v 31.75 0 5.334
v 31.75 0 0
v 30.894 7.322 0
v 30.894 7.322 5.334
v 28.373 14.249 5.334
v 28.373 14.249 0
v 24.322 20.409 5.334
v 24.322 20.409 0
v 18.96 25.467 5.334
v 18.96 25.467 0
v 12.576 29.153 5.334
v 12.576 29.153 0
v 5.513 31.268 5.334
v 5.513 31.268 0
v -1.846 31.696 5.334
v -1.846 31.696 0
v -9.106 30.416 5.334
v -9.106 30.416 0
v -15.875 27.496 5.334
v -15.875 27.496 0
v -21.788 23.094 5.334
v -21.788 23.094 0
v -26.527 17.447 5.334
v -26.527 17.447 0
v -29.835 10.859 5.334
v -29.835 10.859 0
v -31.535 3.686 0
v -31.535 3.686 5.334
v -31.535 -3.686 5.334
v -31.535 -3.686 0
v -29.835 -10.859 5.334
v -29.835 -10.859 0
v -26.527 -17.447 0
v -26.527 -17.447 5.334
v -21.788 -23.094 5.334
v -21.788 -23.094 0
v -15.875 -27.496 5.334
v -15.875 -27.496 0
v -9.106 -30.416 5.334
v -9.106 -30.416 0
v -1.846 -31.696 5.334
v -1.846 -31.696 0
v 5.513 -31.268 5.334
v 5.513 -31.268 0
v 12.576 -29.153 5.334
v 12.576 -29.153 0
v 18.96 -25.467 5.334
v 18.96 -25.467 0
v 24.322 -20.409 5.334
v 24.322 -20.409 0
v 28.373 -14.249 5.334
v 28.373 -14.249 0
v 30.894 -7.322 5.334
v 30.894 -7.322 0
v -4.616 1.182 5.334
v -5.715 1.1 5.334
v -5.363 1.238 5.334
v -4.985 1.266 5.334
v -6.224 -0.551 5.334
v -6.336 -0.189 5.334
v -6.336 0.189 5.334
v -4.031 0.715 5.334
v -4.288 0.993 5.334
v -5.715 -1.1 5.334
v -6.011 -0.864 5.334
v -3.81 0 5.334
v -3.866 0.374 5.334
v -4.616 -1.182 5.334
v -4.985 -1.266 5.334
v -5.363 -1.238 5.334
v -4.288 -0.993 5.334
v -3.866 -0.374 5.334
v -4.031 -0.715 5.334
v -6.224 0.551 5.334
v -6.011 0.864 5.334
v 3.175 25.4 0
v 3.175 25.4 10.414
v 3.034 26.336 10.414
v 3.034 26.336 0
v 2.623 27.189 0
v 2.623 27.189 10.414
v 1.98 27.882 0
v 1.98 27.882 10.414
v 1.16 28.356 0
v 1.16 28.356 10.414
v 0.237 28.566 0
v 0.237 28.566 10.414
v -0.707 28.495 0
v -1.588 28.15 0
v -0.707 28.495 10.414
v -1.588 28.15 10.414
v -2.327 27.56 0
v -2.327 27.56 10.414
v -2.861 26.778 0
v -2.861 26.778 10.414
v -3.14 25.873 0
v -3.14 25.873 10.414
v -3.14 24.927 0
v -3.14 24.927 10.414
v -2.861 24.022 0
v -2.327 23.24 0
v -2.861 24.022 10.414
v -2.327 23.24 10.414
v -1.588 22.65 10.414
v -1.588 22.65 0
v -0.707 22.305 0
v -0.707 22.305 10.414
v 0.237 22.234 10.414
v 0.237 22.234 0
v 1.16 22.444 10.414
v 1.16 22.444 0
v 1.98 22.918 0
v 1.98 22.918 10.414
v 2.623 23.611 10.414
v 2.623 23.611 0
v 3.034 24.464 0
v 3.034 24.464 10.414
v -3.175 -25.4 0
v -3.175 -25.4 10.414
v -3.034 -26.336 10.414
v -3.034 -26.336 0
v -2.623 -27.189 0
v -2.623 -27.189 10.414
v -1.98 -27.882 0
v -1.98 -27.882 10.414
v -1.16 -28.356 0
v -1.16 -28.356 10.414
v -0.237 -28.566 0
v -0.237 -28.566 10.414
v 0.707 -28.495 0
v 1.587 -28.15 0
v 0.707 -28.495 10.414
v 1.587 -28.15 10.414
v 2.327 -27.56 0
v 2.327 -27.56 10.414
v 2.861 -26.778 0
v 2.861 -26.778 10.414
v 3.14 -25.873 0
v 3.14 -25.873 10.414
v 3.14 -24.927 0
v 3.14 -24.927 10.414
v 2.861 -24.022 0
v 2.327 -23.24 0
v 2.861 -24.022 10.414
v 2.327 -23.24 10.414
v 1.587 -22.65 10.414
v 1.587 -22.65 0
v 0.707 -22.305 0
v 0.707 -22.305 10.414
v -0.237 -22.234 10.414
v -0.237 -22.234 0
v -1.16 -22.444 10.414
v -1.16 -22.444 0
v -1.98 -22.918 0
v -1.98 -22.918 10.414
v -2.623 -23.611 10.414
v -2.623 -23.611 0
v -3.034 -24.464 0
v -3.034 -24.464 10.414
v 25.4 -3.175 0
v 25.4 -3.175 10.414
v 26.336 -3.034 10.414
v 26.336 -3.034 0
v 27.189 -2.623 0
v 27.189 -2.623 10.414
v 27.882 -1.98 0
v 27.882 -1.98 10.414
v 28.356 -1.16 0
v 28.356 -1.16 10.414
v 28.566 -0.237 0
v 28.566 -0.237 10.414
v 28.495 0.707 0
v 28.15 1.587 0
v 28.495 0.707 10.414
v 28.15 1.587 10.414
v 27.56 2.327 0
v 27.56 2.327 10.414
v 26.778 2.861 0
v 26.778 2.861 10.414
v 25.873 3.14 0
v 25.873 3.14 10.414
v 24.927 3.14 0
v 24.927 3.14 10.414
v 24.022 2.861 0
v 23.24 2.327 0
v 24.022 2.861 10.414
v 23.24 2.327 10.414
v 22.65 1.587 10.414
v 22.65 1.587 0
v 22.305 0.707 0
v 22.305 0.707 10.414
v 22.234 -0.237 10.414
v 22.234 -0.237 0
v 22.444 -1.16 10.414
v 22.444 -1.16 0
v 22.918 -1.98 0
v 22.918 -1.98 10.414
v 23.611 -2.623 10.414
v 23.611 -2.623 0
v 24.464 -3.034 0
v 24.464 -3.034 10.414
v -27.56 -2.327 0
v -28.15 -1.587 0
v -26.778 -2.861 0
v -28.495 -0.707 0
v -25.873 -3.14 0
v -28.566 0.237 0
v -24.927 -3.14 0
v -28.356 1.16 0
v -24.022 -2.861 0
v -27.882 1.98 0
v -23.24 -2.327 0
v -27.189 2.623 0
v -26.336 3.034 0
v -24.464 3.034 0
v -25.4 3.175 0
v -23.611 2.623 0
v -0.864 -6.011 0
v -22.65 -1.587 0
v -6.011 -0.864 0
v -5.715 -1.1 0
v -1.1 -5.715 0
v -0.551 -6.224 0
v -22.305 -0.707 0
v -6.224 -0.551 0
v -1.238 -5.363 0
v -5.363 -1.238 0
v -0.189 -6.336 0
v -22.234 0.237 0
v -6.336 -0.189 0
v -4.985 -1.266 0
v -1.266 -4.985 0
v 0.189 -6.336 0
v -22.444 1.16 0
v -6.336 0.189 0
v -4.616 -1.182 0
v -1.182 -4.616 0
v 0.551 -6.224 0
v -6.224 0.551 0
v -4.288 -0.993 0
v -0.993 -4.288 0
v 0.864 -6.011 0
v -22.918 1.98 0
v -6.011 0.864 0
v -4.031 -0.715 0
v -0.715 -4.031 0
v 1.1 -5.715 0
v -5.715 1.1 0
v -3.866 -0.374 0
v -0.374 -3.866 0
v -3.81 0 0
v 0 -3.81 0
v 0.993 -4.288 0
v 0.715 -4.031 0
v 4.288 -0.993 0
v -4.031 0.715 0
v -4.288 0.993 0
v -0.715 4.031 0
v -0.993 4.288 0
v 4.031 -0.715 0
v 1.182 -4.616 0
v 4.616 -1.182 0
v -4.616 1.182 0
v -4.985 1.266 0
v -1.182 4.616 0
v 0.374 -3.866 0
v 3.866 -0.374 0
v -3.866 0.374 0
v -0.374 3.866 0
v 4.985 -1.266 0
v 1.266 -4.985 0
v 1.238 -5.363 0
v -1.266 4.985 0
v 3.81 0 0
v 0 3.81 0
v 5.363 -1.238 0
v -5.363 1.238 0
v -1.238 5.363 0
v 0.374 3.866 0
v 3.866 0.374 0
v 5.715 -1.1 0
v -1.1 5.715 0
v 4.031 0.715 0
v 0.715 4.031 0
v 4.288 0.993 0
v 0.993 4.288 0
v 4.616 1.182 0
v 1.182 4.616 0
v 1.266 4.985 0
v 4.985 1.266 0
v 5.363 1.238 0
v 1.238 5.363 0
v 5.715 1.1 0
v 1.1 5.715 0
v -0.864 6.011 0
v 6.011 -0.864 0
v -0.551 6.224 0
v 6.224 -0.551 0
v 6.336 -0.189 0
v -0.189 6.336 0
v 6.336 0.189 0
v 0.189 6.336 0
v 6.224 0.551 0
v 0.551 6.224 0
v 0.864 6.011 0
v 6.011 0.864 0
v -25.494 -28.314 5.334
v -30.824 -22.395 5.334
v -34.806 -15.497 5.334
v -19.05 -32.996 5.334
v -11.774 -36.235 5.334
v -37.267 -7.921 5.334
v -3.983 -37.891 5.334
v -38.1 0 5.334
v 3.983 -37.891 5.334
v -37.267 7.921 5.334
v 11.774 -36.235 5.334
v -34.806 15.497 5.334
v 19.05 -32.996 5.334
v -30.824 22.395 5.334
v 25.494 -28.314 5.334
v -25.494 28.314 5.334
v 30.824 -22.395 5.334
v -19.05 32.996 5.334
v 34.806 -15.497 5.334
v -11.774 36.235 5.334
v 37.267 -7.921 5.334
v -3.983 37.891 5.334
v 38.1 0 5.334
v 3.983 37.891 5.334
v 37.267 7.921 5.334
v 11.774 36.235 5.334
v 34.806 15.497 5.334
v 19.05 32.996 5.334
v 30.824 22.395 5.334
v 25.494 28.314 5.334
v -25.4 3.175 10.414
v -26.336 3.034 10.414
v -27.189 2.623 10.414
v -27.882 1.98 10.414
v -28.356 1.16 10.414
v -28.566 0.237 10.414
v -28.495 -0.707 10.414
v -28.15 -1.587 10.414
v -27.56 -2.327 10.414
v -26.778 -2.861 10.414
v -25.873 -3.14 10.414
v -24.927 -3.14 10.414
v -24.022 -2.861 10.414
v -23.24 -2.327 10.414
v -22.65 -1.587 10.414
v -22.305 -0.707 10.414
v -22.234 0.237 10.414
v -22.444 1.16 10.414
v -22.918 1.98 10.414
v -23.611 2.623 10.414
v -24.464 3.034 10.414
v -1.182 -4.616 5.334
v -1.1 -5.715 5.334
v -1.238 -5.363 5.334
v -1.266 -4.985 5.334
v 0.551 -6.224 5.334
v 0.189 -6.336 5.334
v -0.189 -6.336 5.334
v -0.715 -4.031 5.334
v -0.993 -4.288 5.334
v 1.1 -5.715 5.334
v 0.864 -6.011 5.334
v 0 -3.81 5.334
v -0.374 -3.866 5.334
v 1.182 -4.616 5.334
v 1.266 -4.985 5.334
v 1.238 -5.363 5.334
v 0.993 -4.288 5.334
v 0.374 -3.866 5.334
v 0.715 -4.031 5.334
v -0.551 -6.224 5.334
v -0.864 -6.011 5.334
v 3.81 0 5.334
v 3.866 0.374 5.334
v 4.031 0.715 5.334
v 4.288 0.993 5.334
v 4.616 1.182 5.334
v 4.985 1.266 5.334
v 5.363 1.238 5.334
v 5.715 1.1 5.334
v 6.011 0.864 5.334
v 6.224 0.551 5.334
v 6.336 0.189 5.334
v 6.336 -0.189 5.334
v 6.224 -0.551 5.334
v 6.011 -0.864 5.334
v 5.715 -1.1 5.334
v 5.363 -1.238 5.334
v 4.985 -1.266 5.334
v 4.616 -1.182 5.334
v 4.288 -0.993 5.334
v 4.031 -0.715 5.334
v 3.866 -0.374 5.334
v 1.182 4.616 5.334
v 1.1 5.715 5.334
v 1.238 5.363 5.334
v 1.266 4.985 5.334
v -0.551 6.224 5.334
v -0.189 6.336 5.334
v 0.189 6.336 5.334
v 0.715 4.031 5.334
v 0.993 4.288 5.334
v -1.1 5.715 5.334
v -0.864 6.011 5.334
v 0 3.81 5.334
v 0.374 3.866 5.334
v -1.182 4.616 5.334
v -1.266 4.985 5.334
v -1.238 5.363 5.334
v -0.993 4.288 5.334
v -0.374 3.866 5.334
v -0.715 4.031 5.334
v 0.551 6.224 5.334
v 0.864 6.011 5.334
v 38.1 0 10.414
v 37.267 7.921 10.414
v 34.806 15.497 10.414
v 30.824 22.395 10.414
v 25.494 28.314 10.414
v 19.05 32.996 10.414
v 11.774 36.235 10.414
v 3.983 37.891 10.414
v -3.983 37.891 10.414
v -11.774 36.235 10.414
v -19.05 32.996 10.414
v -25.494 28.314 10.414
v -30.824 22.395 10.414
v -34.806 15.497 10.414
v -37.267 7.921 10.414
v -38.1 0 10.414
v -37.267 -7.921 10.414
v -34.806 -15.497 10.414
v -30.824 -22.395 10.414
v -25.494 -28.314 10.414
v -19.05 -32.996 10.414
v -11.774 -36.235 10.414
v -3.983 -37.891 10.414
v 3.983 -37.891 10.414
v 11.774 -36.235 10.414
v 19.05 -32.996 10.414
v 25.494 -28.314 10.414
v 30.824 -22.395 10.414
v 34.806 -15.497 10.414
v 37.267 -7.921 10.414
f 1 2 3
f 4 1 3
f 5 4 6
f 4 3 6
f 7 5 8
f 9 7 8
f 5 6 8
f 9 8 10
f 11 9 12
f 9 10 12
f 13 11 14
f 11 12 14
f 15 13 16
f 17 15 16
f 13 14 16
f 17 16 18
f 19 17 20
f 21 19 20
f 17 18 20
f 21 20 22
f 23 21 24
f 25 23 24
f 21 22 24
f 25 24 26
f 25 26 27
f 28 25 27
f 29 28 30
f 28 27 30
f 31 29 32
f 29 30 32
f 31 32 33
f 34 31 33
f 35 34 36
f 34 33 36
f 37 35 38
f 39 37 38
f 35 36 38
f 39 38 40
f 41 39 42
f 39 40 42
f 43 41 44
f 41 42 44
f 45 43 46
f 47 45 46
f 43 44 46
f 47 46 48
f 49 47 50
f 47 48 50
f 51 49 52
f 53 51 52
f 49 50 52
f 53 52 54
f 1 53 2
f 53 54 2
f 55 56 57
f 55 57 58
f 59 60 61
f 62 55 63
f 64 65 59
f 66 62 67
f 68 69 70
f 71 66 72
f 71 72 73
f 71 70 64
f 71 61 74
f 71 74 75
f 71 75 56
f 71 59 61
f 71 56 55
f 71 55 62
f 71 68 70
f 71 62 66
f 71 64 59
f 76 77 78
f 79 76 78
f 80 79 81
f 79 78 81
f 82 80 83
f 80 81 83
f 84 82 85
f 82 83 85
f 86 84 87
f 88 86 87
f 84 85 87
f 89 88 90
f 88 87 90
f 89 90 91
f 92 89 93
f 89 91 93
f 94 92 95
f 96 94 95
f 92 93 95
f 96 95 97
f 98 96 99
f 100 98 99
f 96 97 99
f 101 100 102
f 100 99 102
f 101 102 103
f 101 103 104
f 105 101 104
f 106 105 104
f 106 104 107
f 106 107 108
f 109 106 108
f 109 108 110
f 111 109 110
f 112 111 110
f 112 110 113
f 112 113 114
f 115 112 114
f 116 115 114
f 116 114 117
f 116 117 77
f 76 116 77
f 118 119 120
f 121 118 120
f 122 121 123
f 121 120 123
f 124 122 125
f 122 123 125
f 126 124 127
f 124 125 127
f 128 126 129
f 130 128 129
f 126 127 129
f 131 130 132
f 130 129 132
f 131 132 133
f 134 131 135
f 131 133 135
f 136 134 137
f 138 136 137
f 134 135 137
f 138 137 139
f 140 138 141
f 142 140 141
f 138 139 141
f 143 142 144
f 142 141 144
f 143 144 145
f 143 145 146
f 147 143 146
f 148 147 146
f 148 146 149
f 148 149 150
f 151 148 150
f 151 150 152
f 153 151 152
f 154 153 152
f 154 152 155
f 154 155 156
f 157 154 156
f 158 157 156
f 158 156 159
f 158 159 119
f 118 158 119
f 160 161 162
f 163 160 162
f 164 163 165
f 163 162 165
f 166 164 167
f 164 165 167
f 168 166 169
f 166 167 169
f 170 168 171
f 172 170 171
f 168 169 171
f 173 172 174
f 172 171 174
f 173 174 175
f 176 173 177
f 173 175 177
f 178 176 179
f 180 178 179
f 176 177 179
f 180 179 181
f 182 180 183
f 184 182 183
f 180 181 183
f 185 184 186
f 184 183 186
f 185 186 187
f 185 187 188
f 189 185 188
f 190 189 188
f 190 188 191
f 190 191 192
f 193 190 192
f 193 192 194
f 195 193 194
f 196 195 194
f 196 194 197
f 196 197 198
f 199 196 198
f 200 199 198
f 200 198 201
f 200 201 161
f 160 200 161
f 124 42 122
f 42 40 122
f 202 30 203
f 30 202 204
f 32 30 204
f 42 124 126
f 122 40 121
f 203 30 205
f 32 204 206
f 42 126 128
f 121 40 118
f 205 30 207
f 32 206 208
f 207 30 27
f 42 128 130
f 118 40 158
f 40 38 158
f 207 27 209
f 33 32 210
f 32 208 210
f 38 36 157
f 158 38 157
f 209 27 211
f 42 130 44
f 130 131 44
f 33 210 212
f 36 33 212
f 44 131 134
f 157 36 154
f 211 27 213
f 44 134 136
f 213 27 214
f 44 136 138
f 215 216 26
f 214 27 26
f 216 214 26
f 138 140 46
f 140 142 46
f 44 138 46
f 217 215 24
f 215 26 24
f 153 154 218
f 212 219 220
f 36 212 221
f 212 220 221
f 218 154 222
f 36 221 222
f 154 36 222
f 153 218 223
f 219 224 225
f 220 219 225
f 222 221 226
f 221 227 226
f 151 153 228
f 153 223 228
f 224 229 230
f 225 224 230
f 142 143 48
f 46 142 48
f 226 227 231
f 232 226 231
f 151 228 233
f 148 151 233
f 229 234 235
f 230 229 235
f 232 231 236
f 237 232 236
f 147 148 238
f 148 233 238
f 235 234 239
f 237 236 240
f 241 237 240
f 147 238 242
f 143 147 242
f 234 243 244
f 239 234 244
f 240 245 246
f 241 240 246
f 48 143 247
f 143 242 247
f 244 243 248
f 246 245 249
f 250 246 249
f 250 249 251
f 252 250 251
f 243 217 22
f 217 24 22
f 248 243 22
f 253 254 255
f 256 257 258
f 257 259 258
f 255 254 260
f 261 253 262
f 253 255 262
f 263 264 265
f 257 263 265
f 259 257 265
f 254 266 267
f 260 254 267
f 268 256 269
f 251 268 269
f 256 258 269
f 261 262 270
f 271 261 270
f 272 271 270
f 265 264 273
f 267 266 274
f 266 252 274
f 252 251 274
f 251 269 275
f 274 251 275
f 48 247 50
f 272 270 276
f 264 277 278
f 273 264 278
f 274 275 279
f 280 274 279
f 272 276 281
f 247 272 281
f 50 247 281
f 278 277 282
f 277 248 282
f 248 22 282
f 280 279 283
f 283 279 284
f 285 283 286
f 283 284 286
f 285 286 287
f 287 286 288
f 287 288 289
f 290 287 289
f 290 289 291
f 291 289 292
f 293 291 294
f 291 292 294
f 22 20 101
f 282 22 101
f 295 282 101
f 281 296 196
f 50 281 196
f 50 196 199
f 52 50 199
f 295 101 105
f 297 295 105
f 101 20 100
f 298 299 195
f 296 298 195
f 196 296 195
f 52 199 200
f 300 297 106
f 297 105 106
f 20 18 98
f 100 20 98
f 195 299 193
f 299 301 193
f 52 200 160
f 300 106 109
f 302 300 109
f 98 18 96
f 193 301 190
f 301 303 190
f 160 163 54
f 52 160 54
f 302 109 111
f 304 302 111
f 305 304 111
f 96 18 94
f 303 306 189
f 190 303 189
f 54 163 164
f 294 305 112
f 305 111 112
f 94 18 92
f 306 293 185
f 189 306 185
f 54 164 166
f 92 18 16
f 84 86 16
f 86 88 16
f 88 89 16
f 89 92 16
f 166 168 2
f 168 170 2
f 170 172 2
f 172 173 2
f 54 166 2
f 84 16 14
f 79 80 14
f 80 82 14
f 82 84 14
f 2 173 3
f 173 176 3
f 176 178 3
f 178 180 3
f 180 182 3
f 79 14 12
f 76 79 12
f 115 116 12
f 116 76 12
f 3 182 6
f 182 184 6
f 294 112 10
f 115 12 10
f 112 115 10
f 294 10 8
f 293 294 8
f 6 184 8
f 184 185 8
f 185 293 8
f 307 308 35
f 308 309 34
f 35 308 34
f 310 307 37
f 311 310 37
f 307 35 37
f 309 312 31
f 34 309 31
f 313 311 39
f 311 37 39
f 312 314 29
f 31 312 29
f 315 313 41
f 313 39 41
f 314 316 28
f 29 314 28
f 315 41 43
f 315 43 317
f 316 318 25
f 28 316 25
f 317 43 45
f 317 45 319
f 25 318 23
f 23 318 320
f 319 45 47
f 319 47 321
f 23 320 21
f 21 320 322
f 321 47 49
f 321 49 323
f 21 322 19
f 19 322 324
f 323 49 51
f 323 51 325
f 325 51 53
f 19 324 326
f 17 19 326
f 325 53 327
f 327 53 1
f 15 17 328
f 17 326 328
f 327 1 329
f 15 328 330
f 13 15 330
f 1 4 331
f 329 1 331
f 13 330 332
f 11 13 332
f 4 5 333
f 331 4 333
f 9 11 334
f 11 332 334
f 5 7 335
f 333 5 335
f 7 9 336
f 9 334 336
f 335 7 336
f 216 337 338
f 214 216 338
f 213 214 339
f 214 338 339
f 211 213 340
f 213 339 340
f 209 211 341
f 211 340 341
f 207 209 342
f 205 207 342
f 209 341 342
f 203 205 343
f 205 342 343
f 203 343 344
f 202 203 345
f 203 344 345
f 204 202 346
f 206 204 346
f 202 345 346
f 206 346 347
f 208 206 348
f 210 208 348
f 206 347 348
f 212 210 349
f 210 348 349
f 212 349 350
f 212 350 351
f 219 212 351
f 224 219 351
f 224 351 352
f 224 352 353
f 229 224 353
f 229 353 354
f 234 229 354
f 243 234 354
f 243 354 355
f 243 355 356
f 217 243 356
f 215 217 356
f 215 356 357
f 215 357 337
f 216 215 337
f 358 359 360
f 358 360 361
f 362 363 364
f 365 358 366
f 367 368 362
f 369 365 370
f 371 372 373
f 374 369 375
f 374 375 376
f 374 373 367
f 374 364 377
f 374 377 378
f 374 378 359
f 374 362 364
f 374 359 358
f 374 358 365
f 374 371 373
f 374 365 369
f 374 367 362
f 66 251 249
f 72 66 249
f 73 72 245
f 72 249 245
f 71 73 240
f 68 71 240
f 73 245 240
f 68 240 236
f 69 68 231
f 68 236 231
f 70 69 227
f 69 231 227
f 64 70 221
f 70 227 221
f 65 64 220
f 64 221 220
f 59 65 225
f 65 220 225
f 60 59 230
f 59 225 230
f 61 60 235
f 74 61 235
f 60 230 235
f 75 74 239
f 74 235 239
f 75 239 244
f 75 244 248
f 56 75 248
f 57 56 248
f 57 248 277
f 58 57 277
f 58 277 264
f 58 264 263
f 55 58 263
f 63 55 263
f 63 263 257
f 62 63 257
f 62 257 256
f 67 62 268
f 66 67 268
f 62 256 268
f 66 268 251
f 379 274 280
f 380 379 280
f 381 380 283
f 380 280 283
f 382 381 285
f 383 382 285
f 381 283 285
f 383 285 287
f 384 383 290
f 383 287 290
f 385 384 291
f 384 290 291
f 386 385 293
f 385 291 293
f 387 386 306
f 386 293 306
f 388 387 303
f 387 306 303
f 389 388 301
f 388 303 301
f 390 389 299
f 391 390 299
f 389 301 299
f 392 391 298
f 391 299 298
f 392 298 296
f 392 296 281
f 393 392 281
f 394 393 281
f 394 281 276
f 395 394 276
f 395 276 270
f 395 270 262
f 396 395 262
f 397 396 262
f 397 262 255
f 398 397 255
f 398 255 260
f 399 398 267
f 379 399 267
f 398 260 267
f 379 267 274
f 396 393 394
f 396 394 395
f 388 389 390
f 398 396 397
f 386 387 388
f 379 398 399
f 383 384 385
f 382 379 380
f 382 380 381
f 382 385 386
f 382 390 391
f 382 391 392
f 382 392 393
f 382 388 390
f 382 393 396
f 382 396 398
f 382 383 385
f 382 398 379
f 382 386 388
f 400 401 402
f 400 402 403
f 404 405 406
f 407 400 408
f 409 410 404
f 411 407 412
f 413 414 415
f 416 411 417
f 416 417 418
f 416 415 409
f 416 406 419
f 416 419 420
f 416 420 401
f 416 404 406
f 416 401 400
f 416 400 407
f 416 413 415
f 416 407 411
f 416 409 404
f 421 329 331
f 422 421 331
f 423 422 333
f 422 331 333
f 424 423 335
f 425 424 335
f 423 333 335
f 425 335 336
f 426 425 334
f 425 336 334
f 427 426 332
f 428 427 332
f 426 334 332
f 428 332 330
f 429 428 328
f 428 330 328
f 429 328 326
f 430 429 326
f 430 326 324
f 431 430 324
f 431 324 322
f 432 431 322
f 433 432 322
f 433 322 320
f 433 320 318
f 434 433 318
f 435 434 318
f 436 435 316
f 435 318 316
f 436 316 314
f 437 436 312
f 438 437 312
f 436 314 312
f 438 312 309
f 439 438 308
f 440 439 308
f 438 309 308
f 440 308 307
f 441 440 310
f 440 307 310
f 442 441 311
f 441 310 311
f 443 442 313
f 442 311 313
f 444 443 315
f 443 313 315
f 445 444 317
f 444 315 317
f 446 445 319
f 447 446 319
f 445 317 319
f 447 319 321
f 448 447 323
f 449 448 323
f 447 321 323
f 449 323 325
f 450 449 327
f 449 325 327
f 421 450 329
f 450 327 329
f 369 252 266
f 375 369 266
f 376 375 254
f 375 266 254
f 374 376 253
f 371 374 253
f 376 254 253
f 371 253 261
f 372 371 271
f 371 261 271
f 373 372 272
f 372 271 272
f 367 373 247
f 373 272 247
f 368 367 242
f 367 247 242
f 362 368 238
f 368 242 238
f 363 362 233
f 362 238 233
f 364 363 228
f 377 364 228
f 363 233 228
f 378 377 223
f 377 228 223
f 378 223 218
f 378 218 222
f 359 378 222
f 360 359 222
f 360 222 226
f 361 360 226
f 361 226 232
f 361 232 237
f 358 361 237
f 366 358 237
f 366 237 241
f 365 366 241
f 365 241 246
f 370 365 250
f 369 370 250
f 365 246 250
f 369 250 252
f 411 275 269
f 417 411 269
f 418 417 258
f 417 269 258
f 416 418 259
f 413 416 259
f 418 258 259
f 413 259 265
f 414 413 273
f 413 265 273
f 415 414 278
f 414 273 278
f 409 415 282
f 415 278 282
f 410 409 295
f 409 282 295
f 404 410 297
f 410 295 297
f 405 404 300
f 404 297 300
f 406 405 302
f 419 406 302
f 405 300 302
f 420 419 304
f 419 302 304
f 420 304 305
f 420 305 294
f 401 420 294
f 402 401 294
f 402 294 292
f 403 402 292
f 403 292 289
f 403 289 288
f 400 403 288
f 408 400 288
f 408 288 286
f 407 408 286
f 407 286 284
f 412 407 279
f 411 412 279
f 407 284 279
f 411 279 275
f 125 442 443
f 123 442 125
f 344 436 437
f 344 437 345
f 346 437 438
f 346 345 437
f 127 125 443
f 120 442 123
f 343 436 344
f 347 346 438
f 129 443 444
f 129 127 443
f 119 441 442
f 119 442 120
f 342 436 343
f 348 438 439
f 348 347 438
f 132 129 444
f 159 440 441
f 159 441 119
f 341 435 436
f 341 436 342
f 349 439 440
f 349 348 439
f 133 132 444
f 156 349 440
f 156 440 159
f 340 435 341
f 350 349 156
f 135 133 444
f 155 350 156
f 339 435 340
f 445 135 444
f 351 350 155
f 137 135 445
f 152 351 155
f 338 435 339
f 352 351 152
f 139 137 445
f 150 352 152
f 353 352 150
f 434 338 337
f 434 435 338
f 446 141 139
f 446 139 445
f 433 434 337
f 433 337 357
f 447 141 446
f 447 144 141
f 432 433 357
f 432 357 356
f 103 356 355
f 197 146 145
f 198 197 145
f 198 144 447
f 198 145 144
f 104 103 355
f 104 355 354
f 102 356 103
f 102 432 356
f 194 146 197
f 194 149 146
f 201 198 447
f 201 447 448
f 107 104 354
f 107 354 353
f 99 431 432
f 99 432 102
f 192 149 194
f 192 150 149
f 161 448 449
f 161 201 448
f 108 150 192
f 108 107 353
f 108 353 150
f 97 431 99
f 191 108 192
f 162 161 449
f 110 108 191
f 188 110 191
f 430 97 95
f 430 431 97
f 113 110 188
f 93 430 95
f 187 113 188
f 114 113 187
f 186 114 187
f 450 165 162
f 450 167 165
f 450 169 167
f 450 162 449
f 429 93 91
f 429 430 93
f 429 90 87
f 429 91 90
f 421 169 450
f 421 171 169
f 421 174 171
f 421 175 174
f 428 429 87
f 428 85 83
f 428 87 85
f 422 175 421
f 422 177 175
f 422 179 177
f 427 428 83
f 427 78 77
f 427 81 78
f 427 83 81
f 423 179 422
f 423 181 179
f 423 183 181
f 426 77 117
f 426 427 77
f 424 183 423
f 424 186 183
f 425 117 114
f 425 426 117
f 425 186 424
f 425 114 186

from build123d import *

# Parameters (mm, degrees)
SKETCH1_R           = 31.75
BOSS_EXTRUDE1_DEPTH = 5.334
SKETCH2_R           = 38.1
BOSS_EXTRUDE2_DEPTH = 5.08
SKETCH3_R           = 3.175
CUT_EXTRUDE1_DEPTH  = 55.878697106
CIRPATTERN1_COUNT   = 4
SKETCH6_R           = 1.27
CUT_EXTRUDE3_DEPTH  = 5.334
CIRPATTERN2_COUNT   = 4


with BuildPart() as part:
    # Sketch1 → Boss-Extrude1 (new body)
    with BuildSketch(Plane.XY):
        Circle(SKETCH1_R)
    extrude(amount=BOSS_EXTRUDE1_DEPTH)

    # Sketch2 → Boss-Extrude2 (add)
    with BuildSketch(Plane.XY.offset(5.334)):
        Circle(SKETCH2_R)
    extrude(amount=BOSS_EXTRUDE2_DEPTH)

    # Sketch3 → Cut-Extrude1 (cut, through all)
    with BuildSketch(Plane.XY.offset(10.414)):
        with Locations((0, 25.4)):
            Circle(SKETCH3_R)
    cut_extrude1 = extrude(amount=-CUT_EXTRUDE1_DEPTH, mode=Mode.SUBTRACT)

    # CirPattern1: Cut-Extrude1 ×4 about axis
    cirpattern1_axis = Axis((0, 0, 0), (0, 0, 1))
    for i in range(1, CIRPATTERN1_COUNT):
        add(cut_extrude1.rotate(cirpattern1_axis, i * 360 / CIRPATTERN1_COUNT), mode=Mode.SUBTRACT)

    # Sketch6 → Cut-Extrude3 (cut)
    with BuildSketch(Plane(origin=(0, 0, 0), x_dir=(-1, 0, 0), z_dir=(0, 0, -1))):
        with Locations((-5.08, 0)):
            Circle(SKETCH6_R)
    cut_extrude3 = extrude(amount=-CUT_EXTRUDE3_DEPTH, mode=Mode.SUBTRACT)

    # CirPattern2: Cut-Extrude3 ×4 about axis
    cirpattern2_axis = Axis((0, 0, 0), (0, 0, 1))
    for i in range(1, CIRPATTERN2_COUNT):
        add(cut_extrude3.rotate(cirpattern2_axis, i * 360 / CIRPATTERN2_COUNT), mode=Mode.SUBTRACT)


solid = part.part
